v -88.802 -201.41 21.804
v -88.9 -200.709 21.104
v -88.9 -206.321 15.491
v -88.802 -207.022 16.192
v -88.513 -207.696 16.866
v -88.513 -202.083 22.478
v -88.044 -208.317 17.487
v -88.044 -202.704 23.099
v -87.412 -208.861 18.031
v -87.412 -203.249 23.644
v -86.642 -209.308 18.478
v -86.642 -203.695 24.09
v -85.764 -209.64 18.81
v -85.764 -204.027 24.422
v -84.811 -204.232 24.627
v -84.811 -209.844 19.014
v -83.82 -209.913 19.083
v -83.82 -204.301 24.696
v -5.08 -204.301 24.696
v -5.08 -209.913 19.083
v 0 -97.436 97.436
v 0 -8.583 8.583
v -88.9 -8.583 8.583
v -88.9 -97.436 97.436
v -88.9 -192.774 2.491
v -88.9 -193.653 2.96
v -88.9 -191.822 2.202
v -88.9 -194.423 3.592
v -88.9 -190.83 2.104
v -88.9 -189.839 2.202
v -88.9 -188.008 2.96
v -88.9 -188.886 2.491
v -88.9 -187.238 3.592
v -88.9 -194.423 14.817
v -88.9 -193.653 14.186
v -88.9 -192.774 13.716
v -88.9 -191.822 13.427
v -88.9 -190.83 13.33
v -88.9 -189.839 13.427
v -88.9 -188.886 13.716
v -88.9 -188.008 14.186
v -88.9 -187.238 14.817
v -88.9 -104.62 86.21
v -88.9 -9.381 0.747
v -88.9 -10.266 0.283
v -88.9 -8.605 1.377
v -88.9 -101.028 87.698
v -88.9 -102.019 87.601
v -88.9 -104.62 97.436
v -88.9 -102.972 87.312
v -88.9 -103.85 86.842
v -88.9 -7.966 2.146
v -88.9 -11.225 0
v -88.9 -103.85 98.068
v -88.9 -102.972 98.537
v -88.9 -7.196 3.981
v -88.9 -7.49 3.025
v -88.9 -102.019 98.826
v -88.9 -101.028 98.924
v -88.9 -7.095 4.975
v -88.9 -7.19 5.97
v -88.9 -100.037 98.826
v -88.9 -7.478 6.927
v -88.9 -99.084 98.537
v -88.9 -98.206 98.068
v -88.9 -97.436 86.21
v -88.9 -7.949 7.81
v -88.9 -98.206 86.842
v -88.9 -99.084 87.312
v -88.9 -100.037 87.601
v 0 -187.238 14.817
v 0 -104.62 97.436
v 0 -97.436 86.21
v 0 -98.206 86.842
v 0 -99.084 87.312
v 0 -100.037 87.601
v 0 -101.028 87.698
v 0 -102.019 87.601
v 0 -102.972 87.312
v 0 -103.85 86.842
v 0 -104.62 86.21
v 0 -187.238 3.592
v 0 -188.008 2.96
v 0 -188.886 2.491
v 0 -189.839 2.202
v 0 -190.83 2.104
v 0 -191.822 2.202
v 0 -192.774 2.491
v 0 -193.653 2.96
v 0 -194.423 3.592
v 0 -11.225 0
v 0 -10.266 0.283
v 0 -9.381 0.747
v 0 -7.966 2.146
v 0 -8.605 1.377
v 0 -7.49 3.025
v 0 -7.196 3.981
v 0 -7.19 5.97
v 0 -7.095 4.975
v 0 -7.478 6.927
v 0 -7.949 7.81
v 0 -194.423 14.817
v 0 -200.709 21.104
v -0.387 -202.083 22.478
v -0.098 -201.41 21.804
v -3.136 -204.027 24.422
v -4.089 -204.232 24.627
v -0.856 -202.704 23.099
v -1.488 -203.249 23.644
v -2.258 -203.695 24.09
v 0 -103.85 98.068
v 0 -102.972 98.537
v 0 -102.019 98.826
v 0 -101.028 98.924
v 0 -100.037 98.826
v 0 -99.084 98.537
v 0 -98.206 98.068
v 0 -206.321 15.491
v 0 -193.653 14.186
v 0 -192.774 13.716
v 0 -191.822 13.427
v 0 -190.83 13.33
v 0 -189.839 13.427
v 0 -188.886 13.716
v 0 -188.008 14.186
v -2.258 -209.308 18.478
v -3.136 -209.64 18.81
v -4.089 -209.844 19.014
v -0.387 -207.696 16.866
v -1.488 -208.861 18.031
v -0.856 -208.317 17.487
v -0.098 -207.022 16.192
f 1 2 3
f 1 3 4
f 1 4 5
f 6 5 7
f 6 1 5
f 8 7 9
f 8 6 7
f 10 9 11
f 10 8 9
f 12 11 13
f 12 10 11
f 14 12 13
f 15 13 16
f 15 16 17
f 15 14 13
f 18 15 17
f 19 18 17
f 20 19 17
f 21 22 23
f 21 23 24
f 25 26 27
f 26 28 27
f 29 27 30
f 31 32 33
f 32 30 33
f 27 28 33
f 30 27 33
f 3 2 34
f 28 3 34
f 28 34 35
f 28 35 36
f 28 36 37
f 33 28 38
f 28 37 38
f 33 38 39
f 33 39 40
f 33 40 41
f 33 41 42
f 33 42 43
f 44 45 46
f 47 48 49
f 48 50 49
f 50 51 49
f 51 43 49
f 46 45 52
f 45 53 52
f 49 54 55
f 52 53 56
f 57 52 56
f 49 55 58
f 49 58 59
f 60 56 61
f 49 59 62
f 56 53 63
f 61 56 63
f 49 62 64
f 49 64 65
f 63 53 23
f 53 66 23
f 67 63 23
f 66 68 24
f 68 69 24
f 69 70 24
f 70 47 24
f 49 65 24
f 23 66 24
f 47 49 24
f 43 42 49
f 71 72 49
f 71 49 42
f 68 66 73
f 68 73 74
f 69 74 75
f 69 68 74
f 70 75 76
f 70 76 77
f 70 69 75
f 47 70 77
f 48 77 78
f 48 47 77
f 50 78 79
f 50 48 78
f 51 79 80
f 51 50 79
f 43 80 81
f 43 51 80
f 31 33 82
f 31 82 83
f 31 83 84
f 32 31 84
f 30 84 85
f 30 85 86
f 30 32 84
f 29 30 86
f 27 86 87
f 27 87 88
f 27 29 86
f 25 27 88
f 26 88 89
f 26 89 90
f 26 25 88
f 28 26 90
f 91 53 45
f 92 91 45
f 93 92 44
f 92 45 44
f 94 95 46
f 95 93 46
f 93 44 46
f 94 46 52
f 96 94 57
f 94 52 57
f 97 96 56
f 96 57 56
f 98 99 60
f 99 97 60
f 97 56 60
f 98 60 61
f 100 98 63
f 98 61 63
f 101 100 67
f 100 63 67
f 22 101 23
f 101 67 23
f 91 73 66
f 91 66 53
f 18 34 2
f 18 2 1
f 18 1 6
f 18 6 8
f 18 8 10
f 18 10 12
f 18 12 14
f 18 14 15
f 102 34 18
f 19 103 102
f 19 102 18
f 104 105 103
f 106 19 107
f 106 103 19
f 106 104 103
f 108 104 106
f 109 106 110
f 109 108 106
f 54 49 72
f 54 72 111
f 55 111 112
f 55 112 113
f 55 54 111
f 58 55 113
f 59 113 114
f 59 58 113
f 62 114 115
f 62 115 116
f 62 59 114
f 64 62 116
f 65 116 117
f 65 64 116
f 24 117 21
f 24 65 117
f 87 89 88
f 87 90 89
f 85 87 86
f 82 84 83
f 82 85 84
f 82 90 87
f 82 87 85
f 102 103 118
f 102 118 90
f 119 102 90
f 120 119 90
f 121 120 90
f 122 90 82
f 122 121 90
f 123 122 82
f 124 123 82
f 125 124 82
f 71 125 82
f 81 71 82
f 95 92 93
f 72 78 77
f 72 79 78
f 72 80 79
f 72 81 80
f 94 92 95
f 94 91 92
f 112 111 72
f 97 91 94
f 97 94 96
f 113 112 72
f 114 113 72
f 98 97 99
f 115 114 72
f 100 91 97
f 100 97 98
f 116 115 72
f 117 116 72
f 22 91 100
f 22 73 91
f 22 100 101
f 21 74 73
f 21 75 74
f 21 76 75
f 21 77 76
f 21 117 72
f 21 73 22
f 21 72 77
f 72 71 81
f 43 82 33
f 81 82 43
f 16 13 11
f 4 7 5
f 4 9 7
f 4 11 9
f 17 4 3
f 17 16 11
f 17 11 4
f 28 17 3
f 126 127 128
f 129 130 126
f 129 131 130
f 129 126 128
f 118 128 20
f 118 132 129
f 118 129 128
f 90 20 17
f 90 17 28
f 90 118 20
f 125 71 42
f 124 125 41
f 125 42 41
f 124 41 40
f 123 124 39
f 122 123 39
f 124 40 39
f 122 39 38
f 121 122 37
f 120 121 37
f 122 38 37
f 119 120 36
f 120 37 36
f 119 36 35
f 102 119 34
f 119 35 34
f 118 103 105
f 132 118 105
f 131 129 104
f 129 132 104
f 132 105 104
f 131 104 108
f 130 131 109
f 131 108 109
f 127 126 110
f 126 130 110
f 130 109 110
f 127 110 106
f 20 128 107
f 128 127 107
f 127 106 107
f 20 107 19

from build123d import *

# Parameters (mm, degrees)
F1_DEPTH     = 88.9
F2_T1_DEPTH  = 88.9
F2_T3_DEPTH  = 88.9
F2_T5_DEPTH  = 149.5881510316
F2_T7_DEPTH  = 114.3
F2_T9_DEPTH  = 33.3375
F2_T11_DEPTH = 33.3375
F2_T13_DEPTH = 114.3


# Not quite as in the source:
# - a fillet or chamfer that OpenCascade refuses, or shapes differently, is made with other operations: its cross-section is extruded or revolved along the edge and cut away or added


with BuildPart() as f1:
    # F0 (on Right) → F1 (new body)
    with BuildSketch(Plane.YZ):
        Polygon((-11.2253201513, 0), (0, 0), (-101.027881362, 101.027881362), (-190.8304425727, 11.2253201513), (-204.3008267543, 24.6957043329), (-209.91348683, 19.0830442573), (-190.8304425727, 0), (-101.027881362, 89.8025612107), align=None)
    extrude(amount=-F1_DEPTH)

    # F2: fillet of radius 5.08 on 7 edges, made by hand

    # F2_s2 → F2_t1 (join)
    with BuildSketch(Plane.YZ.offset(-88.9)):
        with BuildLine():
            ThreePointArc((-97.4357789136, 86.2104587623), (-101.027881362, 87.6983563138), (-104.6199838105, 86.2104587623))
            Line((-104.6199838105, 86.2104587623), (-101.027881362, 89.8025612107))
            Line((-101.027881362, 89.8025612107), (-97.4357789136, 86.2104587623))
        make_face()
    extrude(amount=F2_T1_DEPTH)

    # F2_s4 → F2_t3 (join)
    with BuildSketch(Plane.YZ.offset(-88.9)):
        with BuildLine():
            ThreePointArc((-187.2383401243, 14.8174225998), (-190.8304425727, 13.3295250482), (-194.4225450211, 14.8174225998))
            Line((-194.4225450211, 14.8174225998), (-190.8304425727, 11.2253201513))
            Line((-190.8304425727, 11.2253201513), (-187.2383401243, 14.8174225998))
        make_face()
    extrude(amount=F2_T3_DEPTH)

    # F2_s6 → F2_t5 (cut)
    with BuildSketch(Plane.YZ.offset(-119.2440755158)):
        with BuildLine():
            ThreePointArc((-11.2253201513, 0), (-7.3196509923, 3.4955502605), (-8.5826006264, 8.5826006264))
            Line((-8.5826006264, 8.5826006264), (0, 0))
            Line((0, 0), (-11.2253201513, 0))
        make_face()
    extrude(amount=F2_T5_DEPTH, mode=Mode.SUBTRACT)

    # F2_s8 → F2_t7 (cut)
    with BuildSketch(Plane.YZ.offset(-101.6)):
        with BuildLine():
            ThreePointArc((-104.6199838105, 97.4357789136), (-101.027881362, 98.9236764652), (-97.4357789136, 97.4357789136))
            Line((-97.4357789136, 97.4357789136), (-101.027881362, 101.027881362))
            Line((-101.027881362, 101.027881362), (-104.6199838105, 97.4357789136))
        make_face()
    extrude(amount=F2_T7_DEPTH, mode=Mode.SUBTRACT)

    # F2_s10 → F2_t9 (cut)
    with BuildSketch(Plane(origin=(0, -80.8223050896, -80.8223050896), x_dir=(1, 0, 0), z_dir=(0, -0.7071067812, -0.7071067812))):
        with BuildLine():
            ThreePointArc((0, 156.845), (-1.4878975516, 160.4371024484), (-5.08, 161.925))
            Line((-5.08, 161.925), (0, 161.925))
            Line((0, 161.925), (0, 156.845))
        make_face()
    extrude(amount=F2_T9_DEPTH, mode=Mode.SUBTRACT)

    # F2_s12 → F2_t11 (cut)
    with BuildSketch(Plane(origin=(0, -80.8223050896, -80.8223050896), x_dir=(1, 0, 0), z_dir=(0, -0.7071067812, -0.7071067812))):
        with BuildLine():
            ThreePointArc((-88.9, 156.845), (-87.4121024484, 160.4371024484), (-83.82, 161.925))
            Line((-83.82, 161.925), (-88.9, 161.925))
            Line((-88.9, 161.925), (-88.9, 156.845))
        make_face()
    extrude(amount=F2_T11_DEPTH, mode=Mode.SUBTRACT)

    # F2_s14 → F2_t13 (cut)
    with BuildSketch(Plane.YZ.offset(-101.6)):
        with BuildLine():
            ThreePointArc((-187.2383401243, 3.5921024484), (-190.8304425727, 2.1042048969), (-194.4225450211, 3.5921024484))
            Line((-194.4225450211, 3.5921024484), (-190.8304425727, 0))
            Line((-190.8304425727, 0), (-187.2383401243, 3.5921024484))
        make_face()
    extrude(amount=F2_T13_DEPTH, mode=Mode.SUBTRACT)


solid = f1.part
